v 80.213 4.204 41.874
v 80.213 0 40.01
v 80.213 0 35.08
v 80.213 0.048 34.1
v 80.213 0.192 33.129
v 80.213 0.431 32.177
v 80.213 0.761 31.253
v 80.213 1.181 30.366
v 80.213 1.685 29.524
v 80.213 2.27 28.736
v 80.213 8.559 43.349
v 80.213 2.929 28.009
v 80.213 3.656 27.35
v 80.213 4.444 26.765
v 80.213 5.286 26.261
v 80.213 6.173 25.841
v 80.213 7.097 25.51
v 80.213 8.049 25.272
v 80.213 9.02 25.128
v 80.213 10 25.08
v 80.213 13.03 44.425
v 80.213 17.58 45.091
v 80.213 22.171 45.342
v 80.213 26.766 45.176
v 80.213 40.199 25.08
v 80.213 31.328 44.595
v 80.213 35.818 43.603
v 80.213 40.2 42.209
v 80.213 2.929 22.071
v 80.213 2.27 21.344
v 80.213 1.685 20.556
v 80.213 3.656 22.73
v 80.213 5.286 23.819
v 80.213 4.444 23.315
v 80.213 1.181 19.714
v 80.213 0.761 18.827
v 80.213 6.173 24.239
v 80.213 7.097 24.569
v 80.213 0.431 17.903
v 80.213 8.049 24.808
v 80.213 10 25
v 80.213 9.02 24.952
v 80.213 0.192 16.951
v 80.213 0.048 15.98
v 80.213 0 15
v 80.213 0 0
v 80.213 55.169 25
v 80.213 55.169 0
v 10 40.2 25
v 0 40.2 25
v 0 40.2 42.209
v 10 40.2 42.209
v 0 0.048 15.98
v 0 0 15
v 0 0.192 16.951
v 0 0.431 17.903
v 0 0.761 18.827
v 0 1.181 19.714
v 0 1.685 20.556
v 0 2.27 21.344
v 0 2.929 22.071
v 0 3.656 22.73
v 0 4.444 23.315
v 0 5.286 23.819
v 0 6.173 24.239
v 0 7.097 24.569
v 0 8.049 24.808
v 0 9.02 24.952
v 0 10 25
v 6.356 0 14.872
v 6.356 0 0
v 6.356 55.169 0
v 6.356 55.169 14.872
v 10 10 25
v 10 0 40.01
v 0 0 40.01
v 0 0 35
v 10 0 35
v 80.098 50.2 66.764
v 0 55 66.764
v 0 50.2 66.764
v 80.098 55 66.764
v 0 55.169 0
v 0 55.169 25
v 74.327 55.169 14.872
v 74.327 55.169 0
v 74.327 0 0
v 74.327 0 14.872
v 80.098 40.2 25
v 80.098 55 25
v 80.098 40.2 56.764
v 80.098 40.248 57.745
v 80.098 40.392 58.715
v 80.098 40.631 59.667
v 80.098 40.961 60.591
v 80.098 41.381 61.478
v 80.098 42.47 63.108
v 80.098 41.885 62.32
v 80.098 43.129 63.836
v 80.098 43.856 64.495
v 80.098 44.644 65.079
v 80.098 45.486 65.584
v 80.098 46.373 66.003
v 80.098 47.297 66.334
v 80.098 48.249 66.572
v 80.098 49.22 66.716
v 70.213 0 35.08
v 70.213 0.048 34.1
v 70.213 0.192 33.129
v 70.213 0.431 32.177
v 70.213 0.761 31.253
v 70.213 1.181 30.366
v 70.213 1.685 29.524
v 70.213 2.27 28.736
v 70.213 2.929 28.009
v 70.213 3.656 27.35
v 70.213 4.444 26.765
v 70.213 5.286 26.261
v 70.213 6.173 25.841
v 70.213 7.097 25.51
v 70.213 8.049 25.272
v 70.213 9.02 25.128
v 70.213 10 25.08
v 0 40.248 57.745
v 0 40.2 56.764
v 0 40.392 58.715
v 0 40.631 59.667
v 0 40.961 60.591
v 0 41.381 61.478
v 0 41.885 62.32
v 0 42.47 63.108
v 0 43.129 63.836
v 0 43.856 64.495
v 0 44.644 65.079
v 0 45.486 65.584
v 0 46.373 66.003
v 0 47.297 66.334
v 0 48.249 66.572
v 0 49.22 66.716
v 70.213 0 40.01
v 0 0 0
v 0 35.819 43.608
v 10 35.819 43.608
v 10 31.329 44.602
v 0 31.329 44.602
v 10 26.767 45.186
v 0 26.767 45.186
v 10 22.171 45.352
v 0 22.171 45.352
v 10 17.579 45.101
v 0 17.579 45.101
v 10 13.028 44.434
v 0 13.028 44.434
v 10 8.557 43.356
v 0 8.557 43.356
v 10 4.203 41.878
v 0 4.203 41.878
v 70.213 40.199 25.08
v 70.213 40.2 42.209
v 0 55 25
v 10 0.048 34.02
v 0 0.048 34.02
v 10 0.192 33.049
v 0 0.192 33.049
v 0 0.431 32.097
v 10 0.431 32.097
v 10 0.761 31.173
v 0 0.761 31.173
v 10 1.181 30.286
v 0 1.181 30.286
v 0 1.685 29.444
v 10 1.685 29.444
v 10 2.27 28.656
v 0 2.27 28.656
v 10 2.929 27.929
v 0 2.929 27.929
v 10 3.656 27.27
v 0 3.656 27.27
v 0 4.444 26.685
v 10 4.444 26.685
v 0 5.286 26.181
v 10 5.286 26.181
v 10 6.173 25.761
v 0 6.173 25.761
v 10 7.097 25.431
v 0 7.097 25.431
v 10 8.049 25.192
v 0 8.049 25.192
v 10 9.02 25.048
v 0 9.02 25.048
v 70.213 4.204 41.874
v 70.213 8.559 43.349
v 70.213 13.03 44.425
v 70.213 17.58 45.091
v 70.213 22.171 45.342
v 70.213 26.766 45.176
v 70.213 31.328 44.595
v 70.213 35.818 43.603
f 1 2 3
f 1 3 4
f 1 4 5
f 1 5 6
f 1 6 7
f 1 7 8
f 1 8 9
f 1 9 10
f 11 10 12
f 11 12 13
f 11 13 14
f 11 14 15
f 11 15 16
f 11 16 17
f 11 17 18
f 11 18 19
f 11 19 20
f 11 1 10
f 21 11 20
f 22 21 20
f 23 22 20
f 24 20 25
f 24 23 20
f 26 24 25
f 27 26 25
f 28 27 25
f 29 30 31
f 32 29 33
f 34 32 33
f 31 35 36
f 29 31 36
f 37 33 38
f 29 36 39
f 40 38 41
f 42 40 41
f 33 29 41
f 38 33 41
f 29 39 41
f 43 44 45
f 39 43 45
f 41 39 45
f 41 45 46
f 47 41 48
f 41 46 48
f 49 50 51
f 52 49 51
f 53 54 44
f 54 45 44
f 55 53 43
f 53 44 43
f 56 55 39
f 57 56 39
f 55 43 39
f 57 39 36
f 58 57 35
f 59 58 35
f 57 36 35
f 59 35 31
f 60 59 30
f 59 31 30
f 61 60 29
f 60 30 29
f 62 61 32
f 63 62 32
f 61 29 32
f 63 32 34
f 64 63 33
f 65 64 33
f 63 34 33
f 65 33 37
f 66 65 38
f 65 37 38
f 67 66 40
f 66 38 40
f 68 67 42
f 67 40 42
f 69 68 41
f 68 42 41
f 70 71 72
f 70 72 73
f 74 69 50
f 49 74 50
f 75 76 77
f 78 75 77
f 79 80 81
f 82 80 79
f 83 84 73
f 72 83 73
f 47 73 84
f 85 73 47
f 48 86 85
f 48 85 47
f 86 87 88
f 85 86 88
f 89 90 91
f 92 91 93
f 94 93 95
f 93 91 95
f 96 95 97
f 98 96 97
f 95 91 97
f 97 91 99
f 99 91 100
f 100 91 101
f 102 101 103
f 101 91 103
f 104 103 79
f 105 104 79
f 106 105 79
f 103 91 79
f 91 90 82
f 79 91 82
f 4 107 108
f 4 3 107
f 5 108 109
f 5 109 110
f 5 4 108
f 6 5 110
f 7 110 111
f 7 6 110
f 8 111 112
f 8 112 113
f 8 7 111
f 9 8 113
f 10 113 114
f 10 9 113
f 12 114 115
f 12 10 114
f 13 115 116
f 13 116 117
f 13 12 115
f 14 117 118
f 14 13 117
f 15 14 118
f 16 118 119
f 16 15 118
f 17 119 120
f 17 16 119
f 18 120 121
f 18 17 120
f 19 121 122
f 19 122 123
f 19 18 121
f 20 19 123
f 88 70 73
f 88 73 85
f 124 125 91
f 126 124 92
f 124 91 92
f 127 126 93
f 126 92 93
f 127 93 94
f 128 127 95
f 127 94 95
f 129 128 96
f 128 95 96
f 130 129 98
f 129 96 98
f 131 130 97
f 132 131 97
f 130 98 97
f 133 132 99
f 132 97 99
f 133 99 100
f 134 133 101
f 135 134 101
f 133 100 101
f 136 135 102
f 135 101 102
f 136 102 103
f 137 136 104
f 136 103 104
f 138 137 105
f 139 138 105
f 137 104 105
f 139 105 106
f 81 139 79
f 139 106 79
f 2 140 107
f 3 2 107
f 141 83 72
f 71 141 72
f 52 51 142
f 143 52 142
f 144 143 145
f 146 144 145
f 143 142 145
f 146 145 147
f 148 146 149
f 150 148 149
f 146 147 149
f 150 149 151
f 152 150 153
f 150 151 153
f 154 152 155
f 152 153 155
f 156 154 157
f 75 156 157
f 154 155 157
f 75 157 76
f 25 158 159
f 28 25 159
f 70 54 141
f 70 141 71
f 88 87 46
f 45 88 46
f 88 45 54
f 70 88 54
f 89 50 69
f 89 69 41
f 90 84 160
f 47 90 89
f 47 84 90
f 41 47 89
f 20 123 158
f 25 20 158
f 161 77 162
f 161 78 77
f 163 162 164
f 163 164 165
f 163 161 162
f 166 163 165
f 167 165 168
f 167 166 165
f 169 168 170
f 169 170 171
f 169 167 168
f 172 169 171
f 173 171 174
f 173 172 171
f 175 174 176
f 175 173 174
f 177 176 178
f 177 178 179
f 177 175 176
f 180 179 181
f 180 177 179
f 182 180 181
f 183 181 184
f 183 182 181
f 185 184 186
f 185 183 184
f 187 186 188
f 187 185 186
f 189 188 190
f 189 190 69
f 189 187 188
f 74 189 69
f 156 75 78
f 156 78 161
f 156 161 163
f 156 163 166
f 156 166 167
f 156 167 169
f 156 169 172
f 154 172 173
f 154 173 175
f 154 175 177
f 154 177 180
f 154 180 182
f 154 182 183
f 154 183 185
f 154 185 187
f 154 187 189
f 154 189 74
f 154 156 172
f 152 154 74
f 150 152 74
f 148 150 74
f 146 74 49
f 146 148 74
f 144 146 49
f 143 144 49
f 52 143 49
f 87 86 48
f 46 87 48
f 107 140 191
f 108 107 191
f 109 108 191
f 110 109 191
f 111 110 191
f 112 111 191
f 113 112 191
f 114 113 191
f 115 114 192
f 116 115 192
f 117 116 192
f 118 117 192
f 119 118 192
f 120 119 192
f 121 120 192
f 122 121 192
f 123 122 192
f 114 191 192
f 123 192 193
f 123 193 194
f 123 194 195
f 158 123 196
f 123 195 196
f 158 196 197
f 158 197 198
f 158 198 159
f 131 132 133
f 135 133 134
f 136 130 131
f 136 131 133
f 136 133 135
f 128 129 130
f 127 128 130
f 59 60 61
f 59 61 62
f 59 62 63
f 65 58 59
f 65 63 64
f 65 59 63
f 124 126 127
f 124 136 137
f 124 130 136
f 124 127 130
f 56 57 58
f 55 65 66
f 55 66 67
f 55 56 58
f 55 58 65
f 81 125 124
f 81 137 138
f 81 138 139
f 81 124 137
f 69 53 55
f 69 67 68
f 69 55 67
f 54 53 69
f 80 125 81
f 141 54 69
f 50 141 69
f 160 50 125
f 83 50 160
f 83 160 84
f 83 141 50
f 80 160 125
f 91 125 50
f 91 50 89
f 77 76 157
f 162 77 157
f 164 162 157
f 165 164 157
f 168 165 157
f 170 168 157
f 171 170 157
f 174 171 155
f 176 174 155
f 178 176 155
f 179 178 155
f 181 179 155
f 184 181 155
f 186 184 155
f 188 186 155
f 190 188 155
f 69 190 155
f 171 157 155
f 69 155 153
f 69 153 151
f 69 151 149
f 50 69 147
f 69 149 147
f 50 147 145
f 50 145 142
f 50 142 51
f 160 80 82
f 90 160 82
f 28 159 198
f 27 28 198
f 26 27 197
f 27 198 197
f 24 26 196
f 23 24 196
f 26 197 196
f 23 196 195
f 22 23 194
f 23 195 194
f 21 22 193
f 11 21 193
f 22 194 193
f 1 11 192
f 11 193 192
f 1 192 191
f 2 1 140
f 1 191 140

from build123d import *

# Parameters (mm, degrees)
F0_W      = 80.2132
F0_H      = 55.1688
F1_DEPTH  = 25
F3_W      = 80.0983905792
F3_H      = 66.7644366622
F4_DEPTH  = 14.8
F6_DEPTH  = 10
F9_DEPTH  = 10
F10_W     = 67.9705310613
F10_H     = 14.8716745898
F11_DEPTH = 99
F12_R     = 10
F12_2_R   = 10
F12_3_R   = 10


with BuildPart() as f1:
    # F0 (on Top) → F1 (new body)
    with BuildSketch(Plane.XY):
        with Locations((40.1066, 27.5844)):
            Rectangle(F0_W, F0_H)
    extrude(amount=F1_DEPTH)

    # F3 (on offset) → F4 (join)
    with BuildSketch(Plane.XZ.offset(-55)):
        with Locations((40.0491952896, 33.3822183311)):
            Rectangle(F3_W, F3_H)
    extrude(amount=F4_DEPTH)

    # F10 (on Front) → F11 (cut)
    with BuildSketch(Plane.XZ):
        with Locations((40.3414806351, 7.4358372949)):
            Rectangle(F10_W, F10_H)
    extrude(amount=-F11_DEPTH, mode=Mode.SUBTRACT)

    # F12
    f12_edges = [f1.edges().sort_by_distance(p)[0] for p in [
        (40.1066, 0, 25),
        (40.049195, 40.2, 66.764437),
    ]]
    fillet(f12_edges, radius=F12_R)


with BuildPart() as f6:
    # F5 (on Right) → F6 (new body)
    with BuildSketch(Plane.YZ):
        with BuildLine():
            Line((40.1999726892, 24.9999165535), (40.1999726892, 42.2092106919))
            ThreePointArc((40.1999726892, 42.2092106919), (19.8718728741, 45.2787326204), (0, 40.0097407401))
            Line((0, 40.0097407401), (0, 24.9999165535))
            Line((0, 24.9999165535), (40.1999726892, 24.9999165535))
        make_face()
    extrude(amount=F6_DEPTH)

    # F12#2
    f12_2_edges = [f6.edges().sort_by_distance(p)[0] for p in [
        (5, 0, 24.999917),
    ]]
    fillet(f12_2_edges, radius=F12_2_R)


with BuildPart() as f9:
    # F8 (on offset) → F9 (new body)
    with BuildSketch(Plane.YZ.offset(70.213)):
        with BuildLine():
            Line((40.1988625526, 25.079857558), (40.1999279857, 42.2091931105))
            ThreePointArc((40.1999279857, 42.2091931105), (19.8724426746, 45.2681878924), (0, 40.0098487735))
            Line((0, 40.0098487735), (0, 25.079857558))
            Line((0, 25.079857558), (40.1988625526, 25.079857558))
        make_face()
    extrude(amount=F9_DEPTH)

    # F12#3
    f12_3_edges = [f9.edges().sort_by_distance(p)[0] for p in [
        (75.213, 0, 25.079858),
    ]]
    fillet(f12_3_edges, radius=F12_3_R)


solid = Compound([f1.part, f6.part, f9.part])
